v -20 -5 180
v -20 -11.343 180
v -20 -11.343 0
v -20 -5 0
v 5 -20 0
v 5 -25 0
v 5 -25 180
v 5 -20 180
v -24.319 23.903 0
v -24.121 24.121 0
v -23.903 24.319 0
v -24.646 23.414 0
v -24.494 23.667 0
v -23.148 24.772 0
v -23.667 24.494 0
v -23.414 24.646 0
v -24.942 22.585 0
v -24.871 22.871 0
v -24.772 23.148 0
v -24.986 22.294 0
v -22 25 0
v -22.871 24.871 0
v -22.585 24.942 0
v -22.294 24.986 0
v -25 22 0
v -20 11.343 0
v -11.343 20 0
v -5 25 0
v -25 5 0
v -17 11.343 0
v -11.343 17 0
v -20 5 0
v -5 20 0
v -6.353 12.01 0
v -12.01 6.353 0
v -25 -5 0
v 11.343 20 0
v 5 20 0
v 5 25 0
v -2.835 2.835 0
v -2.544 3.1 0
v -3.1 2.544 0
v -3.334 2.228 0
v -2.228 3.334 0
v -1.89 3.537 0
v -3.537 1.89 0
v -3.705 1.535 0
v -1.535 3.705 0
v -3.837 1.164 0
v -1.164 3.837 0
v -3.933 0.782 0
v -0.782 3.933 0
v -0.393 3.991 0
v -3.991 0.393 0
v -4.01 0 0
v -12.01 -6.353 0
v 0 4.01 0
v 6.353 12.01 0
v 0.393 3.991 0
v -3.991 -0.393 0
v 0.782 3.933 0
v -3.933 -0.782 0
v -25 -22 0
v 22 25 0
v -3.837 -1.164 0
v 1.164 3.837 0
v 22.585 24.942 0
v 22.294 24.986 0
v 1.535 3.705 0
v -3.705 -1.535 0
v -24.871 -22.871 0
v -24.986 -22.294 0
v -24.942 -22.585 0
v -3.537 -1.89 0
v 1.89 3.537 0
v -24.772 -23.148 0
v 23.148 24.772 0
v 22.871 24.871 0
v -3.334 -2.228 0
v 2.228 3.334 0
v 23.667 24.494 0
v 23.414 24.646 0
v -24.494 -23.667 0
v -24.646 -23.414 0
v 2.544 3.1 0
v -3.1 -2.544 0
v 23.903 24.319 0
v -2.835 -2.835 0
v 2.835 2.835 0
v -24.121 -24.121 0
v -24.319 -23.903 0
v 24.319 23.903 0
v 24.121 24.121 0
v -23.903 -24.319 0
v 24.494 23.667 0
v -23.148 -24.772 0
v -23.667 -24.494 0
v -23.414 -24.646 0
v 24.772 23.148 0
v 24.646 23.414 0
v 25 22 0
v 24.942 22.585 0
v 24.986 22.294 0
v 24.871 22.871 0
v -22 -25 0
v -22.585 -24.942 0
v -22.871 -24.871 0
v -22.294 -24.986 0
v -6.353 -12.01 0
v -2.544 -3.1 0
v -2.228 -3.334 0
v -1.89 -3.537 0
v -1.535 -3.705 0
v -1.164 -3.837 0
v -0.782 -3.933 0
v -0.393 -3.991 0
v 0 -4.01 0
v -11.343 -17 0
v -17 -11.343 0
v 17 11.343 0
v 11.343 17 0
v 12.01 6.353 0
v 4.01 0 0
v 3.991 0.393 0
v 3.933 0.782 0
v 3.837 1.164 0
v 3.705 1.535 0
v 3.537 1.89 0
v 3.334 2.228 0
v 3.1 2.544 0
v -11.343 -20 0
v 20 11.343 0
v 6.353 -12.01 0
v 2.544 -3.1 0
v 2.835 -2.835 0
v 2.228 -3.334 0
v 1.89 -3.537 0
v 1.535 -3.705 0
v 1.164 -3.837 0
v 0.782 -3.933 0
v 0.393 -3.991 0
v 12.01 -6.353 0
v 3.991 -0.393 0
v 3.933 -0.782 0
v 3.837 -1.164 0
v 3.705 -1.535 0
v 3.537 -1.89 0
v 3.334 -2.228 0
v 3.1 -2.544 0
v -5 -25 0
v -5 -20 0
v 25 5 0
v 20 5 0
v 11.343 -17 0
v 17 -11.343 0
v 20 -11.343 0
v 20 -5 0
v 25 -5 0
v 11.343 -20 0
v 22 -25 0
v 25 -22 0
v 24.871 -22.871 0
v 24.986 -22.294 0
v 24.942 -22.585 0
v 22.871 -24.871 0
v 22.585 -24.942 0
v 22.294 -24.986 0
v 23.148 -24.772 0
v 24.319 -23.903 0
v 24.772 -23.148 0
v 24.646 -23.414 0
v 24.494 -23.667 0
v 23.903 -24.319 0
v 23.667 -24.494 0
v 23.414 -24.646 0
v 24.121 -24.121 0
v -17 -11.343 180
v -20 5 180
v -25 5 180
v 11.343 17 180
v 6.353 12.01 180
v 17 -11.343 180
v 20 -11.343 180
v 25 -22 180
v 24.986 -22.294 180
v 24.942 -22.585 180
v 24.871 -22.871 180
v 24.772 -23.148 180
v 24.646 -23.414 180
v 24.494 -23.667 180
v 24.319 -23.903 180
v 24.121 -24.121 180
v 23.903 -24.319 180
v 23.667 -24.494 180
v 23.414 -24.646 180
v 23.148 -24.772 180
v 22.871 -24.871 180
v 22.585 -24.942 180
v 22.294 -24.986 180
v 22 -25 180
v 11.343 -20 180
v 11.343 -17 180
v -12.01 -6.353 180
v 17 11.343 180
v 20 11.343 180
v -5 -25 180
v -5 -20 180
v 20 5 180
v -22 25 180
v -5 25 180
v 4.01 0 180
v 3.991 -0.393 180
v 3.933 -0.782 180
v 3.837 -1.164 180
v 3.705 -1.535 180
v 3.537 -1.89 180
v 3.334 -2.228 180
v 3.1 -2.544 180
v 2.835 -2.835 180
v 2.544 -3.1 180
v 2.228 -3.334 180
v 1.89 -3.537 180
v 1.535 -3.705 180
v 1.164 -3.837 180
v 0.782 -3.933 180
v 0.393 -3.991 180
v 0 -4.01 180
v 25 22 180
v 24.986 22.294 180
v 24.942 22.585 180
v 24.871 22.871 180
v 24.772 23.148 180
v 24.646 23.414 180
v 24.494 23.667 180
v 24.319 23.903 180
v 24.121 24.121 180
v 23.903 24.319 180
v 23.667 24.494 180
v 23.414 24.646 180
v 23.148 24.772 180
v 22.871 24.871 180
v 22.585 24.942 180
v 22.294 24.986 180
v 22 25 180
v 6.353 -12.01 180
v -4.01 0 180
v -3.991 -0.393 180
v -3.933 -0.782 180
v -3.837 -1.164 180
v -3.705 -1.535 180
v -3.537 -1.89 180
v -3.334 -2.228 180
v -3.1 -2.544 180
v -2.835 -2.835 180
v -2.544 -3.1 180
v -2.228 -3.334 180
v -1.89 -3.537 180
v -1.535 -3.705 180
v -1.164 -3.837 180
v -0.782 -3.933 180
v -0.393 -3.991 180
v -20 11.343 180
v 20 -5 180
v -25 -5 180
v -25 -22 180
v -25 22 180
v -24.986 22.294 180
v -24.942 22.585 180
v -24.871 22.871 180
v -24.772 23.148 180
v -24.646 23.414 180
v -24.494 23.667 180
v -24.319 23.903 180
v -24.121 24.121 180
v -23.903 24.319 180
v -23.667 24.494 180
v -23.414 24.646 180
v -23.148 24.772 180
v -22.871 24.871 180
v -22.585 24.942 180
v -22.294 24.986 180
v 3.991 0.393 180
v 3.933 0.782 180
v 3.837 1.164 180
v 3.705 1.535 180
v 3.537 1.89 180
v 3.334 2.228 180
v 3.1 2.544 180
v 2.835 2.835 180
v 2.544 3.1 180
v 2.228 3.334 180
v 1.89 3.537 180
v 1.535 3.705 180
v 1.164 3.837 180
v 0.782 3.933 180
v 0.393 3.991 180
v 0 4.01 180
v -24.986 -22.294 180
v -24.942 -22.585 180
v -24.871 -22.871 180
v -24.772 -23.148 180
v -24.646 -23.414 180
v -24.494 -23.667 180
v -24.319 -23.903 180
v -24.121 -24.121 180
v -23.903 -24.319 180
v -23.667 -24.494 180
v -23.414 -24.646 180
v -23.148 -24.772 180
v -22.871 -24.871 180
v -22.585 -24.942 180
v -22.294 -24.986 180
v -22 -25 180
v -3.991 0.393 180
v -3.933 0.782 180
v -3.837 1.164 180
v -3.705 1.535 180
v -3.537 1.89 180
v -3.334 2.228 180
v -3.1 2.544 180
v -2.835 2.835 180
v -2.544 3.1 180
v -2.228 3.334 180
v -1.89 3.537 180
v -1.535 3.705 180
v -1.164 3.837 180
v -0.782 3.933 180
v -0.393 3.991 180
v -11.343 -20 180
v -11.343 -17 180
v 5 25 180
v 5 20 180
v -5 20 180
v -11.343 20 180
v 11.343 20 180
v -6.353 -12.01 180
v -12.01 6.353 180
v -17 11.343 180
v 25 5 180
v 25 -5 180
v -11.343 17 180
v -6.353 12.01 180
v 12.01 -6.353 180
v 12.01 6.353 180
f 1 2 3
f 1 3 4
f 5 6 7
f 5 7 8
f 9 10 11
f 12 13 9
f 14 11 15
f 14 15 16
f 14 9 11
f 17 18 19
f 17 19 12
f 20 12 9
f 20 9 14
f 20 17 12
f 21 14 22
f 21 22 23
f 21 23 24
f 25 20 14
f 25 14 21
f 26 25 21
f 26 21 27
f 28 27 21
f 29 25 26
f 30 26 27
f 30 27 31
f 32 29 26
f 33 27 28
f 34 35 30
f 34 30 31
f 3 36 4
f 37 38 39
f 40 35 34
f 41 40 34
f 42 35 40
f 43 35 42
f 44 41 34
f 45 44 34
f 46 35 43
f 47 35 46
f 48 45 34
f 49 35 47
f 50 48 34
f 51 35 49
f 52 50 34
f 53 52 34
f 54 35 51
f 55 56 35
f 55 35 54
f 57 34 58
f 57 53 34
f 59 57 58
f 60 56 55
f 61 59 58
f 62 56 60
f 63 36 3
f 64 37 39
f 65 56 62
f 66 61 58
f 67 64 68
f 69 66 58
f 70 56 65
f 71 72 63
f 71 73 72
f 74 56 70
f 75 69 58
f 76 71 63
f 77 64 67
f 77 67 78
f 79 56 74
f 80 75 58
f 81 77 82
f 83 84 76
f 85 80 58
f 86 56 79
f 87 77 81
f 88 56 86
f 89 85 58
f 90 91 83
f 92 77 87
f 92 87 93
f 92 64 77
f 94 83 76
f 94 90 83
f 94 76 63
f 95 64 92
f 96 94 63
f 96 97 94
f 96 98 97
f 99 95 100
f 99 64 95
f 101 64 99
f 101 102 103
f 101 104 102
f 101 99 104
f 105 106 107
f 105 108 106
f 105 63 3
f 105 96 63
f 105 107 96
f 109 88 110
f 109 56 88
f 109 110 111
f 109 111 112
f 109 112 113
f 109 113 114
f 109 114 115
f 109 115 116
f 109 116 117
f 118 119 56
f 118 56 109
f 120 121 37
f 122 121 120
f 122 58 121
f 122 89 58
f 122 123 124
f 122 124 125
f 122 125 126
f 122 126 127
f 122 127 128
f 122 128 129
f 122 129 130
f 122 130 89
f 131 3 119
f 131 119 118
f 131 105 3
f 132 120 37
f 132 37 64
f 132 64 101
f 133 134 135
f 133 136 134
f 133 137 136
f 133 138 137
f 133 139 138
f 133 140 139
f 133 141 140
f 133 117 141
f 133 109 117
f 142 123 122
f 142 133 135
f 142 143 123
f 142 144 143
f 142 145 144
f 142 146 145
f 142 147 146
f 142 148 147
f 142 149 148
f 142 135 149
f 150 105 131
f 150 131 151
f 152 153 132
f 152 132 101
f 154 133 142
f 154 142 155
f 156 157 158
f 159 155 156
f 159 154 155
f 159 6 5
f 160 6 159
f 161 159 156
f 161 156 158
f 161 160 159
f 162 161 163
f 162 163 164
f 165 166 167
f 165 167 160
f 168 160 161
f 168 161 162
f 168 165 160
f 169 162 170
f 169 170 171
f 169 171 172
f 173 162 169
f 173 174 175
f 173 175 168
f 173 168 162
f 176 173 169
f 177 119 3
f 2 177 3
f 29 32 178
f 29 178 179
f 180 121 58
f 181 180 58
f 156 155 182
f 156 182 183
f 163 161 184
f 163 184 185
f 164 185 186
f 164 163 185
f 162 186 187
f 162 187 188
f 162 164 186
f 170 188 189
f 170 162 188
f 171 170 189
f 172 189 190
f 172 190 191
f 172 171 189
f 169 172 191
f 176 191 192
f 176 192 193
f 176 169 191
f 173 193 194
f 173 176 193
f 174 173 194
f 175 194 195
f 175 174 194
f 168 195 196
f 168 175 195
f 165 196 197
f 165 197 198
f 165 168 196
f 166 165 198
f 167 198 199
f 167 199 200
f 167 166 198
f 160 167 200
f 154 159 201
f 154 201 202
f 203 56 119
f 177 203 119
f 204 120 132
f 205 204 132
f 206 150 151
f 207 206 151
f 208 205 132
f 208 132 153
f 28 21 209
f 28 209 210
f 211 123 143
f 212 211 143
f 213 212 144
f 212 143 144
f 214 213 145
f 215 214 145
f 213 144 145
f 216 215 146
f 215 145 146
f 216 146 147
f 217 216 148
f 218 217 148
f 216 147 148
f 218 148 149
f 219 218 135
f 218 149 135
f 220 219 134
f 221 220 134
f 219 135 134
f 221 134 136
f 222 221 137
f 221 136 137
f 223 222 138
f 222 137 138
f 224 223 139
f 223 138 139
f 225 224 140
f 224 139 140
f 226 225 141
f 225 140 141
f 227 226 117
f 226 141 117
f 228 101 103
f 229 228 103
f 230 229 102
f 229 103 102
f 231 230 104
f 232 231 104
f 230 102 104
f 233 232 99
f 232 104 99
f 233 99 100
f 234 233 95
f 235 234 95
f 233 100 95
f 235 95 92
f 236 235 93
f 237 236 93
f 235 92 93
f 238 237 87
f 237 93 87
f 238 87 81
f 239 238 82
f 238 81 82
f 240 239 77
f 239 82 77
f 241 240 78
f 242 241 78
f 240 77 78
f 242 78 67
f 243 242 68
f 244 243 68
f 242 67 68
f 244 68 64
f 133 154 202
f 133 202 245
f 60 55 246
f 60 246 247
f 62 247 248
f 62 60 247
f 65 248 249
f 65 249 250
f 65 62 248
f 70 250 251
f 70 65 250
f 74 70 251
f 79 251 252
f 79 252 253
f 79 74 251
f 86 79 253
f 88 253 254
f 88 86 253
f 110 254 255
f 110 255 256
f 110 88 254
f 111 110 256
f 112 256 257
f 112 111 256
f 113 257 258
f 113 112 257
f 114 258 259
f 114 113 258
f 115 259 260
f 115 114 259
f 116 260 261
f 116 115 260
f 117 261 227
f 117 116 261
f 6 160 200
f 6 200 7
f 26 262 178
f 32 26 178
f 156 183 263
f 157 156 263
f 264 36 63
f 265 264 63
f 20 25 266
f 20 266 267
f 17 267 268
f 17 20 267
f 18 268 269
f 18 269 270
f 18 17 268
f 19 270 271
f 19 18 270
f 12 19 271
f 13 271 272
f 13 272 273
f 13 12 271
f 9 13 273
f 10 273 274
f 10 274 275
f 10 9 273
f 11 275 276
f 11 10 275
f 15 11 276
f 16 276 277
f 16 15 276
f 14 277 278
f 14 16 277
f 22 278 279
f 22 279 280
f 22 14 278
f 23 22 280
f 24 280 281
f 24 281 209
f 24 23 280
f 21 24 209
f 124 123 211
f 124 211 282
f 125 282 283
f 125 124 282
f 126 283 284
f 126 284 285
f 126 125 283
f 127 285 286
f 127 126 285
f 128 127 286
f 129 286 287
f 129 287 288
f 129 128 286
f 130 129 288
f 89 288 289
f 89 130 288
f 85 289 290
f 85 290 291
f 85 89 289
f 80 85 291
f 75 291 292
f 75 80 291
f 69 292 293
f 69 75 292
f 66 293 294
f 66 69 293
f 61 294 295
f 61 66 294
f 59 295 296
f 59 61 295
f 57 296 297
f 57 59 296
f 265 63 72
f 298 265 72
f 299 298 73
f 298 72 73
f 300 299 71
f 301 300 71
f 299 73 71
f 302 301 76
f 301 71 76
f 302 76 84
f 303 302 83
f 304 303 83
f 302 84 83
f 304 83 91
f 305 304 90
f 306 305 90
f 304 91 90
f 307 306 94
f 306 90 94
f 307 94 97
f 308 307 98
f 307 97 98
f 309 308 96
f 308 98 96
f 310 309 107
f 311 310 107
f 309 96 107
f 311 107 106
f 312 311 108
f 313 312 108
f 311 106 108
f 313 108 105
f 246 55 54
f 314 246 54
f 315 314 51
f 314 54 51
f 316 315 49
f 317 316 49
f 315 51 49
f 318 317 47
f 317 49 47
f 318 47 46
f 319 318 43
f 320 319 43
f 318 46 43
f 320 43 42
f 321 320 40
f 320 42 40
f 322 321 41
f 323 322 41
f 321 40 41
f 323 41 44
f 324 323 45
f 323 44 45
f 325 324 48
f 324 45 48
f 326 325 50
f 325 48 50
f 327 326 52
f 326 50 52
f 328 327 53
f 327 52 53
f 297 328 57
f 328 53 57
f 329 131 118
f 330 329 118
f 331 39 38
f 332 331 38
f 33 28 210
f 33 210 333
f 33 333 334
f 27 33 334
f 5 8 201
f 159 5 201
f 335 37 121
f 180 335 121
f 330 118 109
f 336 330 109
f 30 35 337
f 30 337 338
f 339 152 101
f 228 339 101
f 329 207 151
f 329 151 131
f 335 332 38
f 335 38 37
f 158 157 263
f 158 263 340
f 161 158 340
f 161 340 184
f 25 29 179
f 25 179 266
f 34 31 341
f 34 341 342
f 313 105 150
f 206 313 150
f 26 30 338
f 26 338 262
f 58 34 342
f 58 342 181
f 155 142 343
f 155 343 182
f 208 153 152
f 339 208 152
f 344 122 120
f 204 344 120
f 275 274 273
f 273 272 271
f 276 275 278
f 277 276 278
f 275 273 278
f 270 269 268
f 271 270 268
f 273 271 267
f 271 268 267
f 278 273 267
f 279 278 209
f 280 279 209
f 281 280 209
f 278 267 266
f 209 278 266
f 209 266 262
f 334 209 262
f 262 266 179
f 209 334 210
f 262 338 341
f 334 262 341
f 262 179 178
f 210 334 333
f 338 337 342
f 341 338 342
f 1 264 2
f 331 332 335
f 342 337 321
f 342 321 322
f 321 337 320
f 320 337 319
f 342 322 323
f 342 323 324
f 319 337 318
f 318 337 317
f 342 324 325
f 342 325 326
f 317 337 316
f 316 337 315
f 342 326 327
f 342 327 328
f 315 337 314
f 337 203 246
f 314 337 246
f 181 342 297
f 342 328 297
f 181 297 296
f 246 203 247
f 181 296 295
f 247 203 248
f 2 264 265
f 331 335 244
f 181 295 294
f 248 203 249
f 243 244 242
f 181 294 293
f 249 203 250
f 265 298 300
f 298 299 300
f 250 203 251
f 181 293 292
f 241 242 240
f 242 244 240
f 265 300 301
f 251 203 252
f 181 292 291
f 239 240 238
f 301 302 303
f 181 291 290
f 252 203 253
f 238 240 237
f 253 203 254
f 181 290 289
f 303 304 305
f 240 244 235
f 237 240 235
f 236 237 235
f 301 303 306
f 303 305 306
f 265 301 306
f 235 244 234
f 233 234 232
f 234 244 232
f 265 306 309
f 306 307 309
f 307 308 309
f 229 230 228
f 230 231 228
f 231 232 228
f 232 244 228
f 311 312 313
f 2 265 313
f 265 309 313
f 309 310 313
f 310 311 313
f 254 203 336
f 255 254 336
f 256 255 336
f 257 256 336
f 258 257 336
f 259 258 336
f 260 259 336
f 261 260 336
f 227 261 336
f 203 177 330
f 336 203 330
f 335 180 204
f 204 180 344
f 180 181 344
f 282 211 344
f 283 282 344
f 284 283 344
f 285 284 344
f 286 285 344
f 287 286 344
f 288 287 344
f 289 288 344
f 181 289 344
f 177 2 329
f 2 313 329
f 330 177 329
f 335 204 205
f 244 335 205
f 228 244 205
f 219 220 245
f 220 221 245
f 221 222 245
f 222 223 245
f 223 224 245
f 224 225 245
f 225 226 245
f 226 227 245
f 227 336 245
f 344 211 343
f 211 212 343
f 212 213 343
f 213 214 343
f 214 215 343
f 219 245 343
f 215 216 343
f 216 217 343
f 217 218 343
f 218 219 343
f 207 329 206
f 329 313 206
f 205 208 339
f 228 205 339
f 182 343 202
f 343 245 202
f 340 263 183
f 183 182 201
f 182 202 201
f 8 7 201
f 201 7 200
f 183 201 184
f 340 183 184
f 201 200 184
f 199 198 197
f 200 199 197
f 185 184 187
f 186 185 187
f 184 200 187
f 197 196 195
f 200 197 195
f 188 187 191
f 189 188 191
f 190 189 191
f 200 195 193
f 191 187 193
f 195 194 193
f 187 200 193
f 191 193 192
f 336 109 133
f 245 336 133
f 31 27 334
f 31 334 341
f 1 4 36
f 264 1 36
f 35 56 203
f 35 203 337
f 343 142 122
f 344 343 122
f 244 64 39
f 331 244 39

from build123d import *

# Parameters (mm, degrees)
PAD_DEPTH = 180


with BuildPart() as pad:
    # Sketch → Pad (new body)
    with BuildSketch(Plane.XY):
        with BuildLine():
            Line((-4.01, 0), (-12.01, 0))
            Line((-12.01, 0), (-12.01, -6.353146))
            Line((-12.01, -6.353146), (-17, -11.343146))
            Line((-17, -11.343146), (-20, -11.343146))
            Line((-20, -11.343146), (-20, -5))
            Line((-20, -5), (-25, -5))
            Line((-25, -5), (-25, -22))
            ThreePointArc((-25, -22), (-24.12132, -24.12132), (-22, -25))
            Line((-22, -25), (-5, -25))
            Line((-5, -25), (-5, -20))
            Line((-5, -20), (-11.343146, -20))
            Line((-11.343146, -20), (-11.343146, -17))
            Line((-11.343146, -17), (-6.353146, -12.01))
            Line((-6.353146, -12.01), (0, -12.01))
            Line((0, -12.01), (0, -4.01))
            ThreePointArc((-4.01, 0), (-2.835498, -2.835498), (0, -4.01))
        make_face()
    extrude(amount=PAD_DEPTH)


with BuildPart() as part_mirroring:
    # Part__Mirroring: instance of Pad
    add(pad.part.mirror(Plane(origin=(0, 0, 0), x_dir=(1, 0, 0), z_dir=(0, 1, 0))))


with BuildPart() as fusion:
    # Fusion base: copy of Pad
    add(pad.part)

    # Fusion: union Part__Mirroring
    add(part_mirroring.part)


with BuildPart() as perfil_alum_5cmx5cm:
    # Part__Mirroring001: instance of Fusion
    add(fusion.part.mirror(Plane(origin=(0, 0, 0), x_dir=(0, -1, 0), z_dir=(1, 0, 0))))

    # Fusion001: union Fusion
    add(fusion.part)


solid = perfil_alum_5cmx5cm.part
